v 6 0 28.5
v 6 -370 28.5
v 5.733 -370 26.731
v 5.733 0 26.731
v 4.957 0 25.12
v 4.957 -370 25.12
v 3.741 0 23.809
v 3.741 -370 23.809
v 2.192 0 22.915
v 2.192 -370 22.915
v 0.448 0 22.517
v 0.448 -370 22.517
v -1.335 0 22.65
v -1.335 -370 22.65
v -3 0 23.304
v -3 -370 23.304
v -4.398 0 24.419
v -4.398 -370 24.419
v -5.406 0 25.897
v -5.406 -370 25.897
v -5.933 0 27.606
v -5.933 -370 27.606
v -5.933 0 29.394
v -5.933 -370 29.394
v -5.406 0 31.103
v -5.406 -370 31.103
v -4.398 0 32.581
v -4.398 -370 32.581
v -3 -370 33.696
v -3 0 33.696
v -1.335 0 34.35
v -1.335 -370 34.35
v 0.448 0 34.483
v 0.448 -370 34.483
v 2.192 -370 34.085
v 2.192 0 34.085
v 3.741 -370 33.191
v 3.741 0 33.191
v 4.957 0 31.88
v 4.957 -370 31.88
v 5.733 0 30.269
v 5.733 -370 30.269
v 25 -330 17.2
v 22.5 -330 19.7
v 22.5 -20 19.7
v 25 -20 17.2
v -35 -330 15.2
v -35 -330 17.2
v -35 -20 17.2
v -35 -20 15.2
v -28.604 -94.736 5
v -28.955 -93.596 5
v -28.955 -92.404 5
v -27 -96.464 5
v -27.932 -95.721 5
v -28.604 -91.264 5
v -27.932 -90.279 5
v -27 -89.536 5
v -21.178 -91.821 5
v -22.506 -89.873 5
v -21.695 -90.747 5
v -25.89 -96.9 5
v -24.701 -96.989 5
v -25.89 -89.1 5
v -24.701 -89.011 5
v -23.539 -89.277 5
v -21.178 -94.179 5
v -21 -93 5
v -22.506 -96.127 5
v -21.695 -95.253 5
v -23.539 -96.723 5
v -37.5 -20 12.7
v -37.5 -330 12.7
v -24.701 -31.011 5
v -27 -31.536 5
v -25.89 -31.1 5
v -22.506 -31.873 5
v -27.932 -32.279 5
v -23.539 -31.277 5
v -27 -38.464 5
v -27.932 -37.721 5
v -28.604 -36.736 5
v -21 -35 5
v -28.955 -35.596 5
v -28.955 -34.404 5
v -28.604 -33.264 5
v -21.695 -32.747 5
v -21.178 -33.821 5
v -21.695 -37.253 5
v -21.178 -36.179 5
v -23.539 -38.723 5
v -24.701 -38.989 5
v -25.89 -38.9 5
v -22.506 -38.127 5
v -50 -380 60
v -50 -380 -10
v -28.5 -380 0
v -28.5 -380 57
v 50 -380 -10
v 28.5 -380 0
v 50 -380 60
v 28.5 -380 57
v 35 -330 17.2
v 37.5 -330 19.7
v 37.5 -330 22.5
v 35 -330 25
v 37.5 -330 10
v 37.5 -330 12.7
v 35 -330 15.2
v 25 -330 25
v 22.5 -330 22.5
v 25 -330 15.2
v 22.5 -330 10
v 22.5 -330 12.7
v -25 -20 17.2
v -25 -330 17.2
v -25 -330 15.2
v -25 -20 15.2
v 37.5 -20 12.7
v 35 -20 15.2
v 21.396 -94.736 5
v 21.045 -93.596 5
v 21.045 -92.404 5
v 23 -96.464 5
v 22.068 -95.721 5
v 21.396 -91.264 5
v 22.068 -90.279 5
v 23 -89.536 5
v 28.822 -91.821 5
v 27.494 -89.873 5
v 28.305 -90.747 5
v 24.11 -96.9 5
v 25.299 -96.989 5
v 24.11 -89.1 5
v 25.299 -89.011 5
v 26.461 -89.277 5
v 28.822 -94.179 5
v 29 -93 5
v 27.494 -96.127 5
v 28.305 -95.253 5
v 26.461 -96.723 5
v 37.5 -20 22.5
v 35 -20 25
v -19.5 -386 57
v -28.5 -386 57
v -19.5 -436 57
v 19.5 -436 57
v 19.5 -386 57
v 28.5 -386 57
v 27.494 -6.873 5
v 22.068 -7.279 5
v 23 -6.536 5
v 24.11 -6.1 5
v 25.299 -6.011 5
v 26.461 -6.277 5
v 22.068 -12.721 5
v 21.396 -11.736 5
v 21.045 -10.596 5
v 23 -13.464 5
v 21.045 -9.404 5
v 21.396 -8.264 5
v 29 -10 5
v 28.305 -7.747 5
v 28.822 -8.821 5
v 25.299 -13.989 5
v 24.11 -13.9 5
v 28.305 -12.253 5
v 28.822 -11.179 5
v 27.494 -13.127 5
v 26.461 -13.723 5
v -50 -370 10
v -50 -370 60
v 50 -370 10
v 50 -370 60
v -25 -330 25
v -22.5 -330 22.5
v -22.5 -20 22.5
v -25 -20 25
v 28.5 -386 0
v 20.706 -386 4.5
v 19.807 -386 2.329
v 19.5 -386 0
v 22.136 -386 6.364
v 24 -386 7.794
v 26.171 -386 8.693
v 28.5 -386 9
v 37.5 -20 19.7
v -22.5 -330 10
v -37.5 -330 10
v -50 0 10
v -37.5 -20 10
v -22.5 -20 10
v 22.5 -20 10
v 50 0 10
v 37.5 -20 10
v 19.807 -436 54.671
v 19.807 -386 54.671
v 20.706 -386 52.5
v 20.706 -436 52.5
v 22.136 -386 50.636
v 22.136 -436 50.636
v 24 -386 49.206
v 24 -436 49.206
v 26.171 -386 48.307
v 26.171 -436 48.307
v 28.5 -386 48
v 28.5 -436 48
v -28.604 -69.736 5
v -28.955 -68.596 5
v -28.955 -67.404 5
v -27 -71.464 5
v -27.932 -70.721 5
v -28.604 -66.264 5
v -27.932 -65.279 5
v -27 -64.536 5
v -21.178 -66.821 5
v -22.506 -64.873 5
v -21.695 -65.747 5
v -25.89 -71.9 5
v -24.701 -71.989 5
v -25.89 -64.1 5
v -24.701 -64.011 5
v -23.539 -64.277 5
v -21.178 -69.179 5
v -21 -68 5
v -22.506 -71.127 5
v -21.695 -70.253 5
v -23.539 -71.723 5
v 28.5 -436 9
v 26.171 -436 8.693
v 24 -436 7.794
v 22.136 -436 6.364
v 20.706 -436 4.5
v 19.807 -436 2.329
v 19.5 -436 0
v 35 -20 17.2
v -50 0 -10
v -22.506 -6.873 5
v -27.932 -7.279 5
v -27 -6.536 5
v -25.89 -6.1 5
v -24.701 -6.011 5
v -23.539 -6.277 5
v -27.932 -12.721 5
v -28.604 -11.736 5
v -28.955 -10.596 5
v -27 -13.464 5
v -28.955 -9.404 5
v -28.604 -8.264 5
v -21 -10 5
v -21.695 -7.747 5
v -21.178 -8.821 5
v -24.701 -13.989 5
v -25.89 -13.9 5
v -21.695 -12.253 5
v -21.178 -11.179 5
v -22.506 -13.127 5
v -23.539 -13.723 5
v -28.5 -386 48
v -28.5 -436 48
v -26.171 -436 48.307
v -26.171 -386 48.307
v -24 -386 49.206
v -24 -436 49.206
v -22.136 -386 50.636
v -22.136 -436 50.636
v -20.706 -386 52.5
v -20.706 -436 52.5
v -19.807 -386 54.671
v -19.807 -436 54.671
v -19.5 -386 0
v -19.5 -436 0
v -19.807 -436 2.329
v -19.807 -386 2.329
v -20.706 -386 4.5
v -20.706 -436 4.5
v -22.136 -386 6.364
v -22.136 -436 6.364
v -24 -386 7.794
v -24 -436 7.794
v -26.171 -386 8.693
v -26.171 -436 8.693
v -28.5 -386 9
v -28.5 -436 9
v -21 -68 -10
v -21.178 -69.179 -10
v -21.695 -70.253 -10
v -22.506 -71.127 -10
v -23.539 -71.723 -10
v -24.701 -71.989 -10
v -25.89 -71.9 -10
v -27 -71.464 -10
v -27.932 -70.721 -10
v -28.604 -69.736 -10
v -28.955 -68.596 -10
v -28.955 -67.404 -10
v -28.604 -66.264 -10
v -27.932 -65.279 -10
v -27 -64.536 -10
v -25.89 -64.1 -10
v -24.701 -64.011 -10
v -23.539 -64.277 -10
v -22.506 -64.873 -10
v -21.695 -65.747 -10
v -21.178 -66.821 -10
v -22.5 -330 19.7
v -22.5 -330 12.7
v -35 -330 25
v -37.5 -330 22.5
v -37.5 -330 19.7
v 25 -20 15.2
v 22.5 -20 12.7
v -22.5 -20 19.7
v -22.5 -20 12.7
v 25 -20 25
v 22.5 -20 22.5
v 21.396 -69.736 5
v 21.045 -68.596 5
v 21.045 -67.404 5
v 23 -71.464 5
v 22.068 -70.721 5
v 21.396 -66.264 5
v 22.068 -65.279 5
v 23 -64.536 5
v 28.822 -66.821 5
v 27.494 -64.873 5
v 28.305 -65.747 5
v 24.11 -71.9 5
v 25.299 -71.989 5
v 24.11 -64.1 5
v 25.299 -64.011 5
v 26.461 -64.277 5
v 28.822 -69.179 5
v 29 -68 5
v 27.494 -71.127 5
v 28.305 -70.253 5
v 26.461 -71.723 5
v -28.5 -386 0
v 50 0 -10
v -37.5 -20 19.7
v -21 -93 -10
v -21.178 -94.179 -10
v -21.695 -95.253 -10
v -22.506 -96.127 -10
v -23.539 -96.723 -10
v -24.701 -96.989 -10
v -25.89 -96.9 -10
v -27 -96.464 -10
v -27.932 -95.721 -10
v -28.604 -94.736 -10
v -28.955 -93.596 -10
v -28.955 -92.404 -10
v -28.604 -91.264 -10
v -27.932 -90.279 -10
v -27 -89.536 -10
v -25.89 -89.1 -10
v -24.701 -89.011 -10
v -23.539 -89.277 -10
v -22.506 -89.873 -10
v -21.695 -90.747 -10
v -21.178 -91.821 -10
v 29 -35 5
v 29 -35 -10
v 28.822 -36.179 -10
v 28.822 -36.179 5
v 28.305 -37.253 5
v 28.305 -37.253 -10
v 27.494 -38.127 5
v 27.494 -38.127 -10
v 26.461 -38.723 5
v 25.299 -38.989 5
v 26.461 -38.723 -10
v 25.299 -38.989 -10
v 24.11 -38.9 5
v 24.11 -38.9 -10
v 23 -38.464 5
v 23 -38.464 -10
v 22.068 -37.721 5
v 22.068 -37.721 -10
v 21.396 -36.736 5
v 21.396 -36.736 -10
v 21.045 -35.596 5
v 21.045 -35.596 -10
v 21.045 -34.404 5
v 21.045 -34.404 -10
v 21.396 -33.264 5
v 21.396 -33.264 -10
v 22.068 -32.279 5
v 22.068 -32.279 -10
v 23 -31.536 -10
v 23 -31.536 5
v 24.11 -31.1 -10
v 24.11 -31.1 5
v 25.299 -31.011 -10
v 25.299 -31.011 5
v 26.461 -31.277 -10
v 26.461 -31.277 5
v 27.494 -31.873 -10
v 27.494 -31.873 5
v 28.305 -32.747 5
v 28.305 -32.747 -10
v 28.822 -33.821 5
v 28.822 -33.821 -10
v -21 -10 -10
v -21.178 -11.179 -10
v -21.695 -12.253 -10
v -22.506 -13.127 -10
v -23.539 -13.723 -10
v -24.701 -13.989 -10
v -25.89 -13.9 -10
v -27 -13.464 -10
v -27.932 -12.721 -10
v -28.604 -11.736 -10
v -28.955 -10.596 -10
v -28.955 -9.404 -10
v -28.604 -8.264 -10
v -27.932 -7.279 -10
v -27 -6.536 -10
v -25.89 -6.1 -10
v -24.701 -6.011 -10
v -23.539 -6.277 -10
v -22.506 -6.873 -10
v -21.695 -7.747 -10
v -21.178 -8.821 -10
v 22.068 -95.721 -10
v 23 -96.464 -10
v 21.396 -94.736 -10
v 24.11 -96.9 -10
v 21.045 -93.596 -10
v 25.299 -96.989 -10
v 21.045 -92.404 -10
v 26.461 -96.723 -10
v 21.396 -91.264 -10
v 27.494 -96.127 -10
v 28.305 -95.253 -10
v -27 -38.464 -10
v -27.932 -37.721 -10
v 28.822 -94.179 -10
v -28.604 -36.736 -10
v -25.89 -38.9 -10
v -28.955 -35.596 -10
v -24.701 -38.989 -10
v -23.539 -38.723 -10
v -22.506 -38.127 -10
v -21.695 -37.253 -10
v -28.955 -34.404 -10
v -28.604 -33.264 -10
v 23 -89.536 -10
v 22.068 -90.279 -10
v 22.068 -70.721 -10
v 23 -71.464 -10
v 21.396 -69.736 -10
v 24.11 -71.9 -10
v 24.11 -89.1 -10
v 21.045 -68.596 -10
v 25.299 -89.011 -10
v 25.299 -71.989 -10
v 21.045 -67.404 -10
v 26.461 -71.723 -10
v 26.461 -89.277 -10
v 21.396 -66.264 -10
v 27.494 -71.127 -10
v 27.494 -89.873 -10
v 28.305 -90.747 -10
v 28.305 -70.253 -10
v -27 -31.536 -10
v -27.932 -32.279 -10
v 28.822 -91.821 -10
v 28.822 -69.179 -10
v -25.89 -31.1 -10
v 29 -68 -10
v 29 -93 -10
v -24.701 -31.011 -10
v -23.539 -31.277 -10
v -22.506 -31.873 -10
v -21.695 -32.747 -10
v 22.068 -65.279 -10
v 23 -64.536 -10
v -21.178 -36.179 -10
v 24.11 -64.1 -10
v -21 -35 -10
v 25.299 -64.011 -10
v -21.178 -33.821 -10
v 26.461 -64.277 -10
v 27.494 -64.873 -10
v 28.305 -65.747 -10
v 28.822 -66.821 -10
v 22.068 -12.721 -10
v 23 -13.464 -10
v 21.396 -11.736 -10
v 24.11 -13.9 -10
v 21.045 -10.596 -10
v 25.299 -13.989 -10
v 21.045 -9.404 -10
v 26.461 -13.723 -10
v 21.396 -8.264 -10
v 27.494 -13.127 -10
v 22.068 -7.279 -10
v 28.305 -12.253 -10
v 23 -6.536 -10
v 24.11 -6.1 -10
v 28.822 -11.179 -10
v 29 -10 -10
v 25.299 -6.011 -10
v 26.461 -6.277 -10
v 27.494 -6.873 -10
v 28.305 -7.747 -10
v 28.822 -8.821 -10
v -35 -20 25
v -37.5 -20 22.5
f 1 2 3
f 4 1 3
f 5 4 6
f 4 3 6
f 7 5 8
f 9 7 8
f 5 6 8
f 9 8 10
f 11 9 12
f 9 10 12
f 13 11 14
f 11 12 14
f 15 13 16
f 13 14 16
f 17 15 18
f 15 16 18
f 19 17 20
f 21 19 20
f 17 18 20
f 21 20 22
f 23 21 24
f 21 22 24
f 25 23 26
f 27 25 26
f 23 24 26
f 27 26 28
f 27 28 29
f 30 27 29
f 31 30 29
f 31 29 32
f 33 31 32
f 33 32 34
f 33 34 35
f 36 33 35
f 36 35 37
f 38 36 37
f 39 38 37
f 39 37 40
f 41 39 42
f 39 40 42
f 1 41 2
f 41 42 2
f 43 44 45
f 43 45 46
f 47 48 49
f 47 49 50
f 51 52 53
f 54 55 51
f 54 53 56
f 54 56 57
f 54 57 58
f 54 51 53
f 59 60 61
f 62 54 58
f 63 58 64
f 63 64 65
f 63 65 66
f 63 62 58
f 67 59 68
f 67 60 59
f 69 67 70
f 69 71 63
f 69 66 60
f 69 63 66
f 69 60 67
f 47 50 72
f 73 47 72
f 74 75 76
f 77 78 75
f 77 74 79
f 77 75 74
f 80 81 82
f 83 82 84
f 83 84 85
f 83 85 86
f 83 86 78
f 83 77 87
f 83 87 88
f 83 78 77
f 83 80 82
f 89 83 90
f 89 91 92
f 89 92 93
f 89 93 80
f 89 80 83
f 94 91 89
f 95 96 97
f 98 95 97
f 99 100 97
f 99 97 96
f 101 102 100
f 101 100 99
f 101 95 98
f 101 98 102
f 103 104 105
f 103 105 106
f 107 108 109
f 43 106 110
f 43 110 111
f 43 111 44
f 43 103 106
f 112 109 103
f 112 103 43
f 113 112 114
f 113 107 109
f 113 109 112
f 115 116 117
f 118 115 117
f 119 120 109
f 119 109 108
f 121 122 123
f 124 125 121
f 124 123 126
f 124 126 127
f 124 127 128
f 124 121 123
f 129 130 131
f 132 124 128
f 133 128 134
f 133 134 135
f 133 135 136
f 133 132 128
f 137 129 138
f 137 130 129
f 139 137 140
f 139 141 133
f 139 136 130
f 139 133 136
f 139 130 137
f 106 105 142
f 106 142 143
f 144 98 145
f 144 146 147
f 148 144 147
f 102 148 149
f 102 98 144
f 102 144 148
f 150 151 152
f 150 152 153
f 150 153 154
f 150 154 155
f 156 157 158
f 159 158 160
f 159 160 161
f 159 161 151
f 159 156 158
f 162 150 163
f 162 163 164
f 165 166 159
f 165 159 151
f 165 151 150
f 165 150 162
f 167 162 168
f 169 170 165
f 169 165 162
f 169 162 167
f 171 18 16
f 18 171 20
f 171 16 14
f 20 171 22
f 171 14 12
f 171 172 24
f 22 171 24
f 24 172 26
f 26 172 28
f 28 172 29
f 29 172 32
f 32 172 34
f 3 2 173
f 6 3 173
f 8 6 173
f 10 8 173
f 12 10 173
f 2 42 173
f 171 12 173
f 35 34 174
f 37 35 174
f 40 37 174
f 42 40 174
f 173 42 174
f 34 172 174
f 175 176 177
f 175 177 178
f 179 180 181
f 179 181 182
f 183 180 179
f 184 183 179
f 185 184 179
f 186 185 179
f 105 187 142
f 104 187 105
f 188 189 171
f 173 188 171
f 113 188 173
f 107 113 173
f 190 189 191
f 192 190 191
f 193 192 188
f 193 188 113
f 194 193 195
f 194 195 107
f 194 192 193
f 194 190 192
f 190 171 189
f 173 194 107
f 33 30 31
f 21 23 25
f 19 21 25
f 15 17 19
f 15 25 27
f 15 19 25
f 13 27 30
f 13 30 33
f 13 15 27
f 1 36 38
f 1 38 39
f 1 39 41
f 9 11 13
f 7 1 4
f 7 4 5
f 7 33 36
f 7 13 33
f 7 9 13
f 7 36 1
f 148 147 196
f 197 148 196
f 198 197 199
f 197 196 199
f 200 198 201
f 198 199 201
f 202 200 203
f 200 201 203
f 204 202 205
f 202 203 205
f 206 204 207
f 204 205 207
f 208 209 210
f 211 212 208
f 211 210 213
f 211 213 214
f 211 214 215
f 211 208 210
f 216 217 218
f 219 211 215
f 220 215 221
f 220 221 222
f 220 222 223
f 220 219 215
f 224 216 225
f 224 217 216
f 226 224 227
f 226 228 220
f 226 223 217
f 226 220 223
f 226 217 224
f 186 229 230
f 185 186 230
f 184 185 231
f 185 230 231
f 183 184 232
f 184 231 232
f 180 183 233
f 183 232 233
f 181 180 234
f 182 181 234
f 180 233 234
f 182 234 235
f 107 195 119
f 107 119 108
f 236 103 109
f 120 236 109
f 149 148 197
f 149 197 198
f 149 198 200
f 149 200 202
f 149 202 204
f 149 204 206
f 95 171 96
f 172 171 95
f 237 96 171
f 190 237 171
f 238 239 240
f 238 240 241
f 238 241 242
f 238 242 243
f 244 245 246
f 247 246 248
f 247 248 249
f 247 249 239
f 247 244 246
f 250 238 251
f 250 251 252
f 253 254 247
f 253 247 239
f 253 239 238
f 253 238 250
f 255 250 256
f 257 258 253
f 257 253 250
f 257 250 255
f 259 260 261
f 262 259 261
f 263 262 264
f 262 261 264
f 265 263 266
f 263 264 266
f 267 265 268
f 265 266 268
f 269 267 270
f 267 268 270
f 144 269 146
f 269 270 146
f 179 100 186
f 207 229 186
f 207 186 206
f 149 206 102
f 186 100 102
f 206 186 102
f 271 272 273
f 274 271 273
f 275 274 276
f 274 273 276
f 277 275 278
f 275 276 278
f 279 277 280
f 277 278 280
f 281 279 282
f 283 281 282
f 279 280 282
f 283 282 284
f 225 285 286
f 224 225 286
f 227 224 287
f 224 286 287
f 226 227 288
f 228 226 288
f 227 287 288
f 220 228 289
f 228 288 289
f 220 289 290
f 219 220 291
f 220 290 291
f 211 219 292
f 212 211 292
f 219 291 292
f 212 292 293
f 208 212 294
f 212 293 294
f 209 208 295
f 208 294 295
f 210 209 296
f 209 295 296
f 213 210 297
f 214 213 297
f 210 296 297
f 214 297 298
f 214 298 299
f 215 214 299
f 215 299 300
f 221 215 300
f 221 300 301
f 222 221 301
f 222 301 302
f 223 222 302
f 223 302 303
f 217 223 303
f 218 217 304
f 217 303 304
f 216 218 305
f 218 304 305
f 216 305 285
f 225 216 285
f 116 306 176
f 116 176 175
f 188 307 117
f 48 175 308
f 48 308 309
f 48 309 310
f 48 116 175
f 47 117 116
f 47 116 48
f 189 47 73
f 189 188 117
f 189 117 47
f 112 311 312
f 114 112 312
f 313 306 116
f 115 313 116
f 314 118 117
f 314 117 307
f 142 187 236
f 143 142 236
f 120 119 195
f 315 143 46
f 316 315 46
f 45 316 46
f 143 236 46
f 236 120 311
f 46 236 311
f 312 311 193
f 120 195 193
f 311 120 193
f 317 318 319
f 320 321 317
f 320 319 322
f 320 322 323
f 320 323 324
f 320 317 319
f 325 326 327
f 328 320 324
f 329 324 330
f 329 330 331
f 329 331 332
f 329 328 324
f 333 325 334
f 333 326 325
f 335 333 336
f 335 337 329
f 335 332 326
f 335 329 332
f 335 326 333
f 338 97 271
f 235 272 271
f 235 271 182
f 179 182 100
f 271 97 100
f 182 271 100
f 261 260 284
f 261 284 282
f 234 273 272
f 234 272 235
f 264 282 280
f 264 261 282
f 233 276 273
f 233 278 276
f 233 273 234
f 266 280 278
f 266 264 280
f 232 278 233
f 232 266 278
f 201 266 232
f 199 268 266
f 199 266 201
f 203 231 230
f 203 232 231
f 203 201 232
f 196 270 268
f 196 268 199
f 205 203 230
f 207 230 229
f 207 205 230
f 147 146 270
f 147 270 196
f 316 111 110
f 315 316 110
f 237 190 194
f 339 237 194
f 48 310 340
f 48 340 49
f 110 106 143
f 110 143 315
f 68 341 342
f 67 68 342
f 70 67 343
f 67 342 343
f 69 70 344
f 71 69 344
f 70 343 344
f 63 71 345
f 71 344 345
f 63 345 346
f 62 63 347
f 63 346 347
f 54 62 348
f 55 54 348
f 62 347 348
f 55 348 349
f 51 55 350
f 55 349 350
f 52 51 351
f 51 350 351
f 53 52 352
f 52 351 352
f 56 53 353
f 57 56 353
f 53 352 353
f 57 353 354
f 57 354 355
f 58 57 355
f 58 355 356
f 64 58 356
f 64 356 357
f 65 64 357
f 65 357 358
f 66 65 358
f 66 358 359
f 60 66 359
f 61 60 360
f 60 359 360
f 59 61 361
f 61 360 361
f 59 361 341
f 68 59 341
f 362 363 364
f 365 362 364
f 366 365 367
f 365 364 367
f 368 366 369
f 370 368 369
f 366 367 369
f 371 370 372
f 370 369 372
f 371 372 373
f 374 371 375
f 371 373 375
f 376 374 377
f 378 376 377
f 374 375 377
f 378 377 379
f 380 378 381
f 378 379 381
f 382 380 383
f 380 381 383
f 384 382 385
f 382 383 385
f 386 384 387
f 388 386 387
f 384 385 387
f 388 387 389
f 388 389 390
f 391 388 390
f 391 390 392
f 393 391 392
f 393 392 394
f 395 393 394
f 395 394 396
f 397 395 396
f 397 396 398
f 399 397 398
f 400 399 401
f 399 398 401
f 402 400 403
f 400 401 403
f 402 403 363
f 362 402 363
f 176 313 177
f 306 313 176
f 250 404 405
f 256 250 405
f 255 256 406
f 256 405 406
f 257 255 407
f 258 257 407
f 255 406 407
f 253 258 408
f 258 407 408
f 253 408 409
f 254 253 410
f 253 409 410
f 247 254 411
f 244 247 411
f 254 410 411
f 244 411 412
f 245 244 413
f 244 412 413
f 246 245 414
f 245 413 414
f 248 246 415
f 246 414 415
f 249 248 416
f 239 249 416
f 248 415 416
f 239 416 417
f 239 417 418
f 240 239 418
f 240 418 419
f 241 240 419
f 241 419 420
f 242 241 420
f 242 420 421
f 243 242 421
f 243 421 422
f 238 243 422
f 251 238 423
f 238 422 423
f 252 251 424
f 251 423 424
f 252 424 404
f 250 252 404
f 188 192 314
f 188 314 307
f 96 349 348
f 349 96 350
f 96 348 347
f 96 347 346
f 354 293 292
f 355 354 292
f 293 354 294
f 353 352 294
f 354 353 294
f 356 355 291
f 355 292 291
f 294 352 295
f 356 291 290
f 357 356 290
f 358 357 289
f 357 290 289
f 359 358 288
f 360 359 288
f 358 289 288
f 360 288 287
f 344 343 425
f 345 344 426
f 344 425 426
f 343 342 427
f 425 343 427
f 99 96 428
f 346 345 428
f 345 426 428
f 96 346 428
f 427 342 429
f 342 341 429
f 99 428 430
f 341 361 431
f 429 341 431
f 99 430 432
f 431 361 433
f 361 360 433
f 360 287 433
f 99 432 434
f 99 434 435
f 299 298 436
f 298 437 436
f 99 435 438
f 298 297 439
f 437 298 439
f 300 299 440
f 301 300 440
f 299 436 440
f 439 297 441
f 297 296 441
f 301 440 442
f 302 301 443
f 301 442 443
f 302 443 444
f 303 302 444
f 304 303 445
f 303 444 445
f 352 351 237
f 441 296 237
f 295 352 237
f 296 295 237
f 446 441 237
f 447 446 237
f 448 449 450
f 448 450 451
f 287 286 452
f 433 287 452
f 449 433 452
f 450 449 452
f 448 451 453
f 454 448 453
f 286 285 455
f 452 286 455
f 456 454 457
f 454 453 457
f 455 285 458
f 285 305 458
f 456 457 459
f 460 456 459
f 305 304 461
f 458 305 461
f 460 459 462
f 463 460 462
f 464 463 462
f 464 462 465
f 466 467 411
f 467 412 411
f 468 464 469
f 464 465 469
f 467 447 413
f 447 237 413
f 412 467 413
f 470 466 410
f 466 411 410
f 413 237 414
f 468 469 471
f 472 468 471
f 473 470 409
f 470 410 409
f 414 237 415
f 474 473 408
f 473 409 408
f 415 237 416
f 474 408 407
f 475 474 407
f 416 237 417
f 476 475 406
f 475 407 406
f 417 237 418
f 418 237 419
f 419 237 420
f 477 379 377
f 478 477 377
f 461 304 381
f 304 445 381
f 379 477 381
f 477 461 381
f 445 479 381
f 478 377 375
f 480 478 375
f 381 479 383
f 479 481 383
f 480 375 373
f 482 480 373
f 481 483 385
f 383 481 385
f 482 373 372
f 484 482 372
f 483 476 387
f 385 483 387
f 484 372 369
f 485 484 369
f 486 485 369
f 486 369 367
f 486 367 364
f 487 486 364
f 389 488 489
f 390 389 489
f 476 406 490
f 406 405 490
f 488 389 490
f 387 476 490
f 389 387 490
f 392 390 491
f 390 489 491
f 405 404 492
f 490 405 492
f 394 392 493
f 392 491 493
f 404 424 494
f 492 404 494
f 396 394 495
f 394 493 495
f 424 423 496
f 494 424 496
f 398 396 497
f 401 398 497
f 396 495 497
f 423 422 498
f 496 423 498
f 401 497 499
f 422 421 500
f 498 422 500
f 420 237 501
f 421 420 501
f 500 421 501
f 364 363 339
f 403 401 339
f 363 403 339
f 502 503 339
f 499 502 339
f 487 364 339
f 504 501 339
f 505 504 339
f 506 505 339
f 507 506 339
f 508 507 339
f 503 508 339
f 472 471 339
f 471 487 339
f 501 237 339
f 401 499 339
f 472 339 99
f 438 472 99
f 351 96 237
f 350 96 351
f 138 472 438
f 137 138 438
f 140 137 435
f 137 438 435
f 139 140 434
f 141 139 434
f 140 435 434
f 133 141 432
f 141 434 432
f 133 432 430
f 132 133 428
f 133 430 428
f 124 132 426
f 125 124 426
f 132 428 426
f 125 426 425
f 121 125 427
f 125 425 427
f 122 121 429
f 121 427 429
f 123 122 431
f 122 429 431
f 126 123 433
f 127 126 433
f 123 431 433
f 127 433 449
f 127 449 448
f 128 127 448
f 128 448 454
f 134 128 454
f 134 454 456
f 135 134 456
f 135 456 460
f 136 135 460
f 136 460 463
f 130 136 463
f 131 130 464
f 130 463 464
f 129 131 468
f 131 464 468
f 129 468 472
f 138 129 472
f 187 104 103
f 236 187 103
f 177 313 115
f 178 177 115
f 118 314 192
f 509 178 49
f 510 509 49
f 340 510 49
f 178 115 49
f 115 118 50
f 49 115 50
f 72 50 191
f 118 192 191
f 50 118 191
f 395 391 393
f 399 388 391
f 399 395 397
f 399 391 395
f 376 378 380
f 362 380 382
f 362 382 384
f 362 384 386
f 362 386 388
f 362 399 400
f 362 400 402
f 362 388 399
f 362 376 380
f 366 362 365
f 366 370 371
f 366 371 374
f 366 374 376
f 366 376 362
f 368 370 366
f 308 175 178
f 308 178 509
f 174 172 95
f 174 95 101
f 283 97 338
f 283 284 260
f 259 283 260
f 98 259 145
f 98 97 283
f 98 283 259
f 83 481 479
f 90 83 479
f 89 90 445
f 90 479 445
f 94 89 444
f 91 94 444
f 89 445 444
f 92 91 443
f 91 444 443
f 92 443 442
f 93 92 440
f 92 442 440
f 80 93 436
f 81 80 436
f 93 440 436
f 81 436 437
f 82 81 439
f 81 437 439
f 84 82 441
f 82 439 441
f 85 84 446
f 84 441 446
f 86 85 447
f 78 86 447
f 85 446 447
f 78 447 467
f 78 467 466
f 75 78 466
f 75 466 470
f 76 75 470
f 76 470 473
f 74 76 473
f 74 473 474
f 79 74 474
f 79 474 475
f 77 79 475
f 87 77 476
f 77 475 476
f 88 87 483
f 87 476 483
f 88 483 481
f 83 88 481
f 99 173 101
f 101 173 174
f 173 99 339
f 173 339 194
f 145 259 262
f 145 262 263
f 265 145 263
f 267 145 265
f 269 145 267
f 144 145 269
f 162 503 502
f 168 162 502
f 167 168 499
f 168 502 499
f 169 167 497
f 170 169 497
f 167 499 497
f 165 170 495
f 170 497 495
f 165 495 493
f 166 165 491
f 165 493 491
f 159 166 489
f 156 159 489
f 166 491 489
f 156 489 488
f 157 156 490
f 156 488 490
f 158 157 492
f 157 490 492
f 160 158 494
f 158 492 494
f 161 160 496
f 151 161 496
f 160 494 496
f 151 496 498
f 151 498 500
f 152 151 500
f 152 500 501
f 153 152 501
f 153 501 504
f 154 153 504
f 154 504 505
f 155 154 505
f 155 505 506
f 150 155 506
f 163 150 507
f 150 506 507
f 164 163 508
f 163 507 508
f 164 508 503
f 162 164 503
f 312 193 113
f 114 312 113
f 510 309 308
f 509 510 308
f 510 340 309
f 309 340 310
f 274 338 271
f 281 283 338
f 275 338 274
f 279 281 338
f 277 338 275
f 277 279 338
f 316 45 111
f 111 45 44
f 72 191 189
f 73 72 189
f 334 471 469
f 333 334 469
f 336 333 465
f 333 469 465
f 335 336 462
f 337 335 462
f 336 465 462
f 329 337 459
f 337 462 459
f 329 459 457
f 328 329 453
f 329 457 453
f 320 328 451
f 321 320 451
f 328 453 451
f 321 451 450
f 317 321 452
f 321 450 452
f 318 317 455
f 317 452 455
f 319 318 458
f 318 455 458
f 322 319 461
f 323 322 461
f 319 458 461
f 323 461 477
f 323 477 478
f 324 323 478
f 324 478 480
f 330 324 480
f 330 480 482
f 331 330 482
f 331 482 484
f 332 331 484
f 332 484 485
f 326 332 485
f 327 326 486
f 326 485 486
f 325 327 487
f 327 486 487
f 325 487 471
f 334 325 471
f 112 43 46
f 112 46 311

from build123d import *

# Parameters (mm, degrees)
SKETCH_W        = 100
SKETCH_H        = 20
PAD_DEPTH       = 370
SKETCH001_W     = 100
SKETCH001_H     = 70
PAD001_DEPTH    = 10
SKETCH002_W     = 57
SKETCH002_H     = 57
PAD002_DEPTH    = 56
SKETCH003_W     = 15
SKETCH003_H     = 310
PAD003_DEPTH    = 15
SKETCH004_R     = 6
PAD004_DEPTH    = 370
SKETCH005_R     = 4
POCKET_DEPTH    = 15
POCKET001_DEPTH = 50
POCKET002_DEPTH = 310


with BuildPart() as part:
    # Sketch → Pad (new body)
    with BuildSketch(Plane.XZ):
        Rectangle(SKETCH_W, SKETCH_H)
    extrude(amount=PAD_DEPTH)

    # Sketch001 (on Face6 of Pad) → Pad001 (join)
    with BuildSketch(Plane.XZ.offset(370)):
        with Locations((0, 25)):
            Rectangle(SKETCH001_W, SKETCH001_H)
    extrude(amount=PAD001_DEPTH)

    # Sketch002 (on Face11 of Pad001) → Pad002 (join)
    with BuildSketch(Plane.XZ.offset(380)):
        with Locations((0, 28.5)):
            Rectangle(SKETCH002_W, SKETCH002_H)
    extrude(amount=PAD002_DEPTH)

    # Sketch003 (on Face1 of Pad002) → Pad003 (join)
    with BuildSketch(Plane(origin=(0, 0, 10), x_dir=(-1, 0, 0), z_dir=(0, 0, 1))):
        with Locations((-30, 175)):
            Rectangle(SKETCH003_W, SKETCH003_H)
        with Locations((30, 175)):
            Rectangle(SKETCH003_W, SKETCH003_H)
    extrude(amount=PAD003_DEPTH)

    # Sketch004 (on Face4 of Pad003) → Pad004 (join)
    with BuildSketch(Plane(origin=(0, -370, 0), x_dir=(1, 0, 0), z_dir=(0, 1, 0))):
        with Locations((0, -28.5)):
            Circle(SKETCH004_R)
    extrude(amount=PAD004_DEPTH)

    # Sketch005 (on Face14 of Pad004) → Pocket (cut)
    with BuildSketch(Plane(origin=(0, 0, -10), x_dir=(1, 0, 0), z_dir=(0, 0, -1))):
        with Locations((-25, 10)):
            Circle(SKETCH005_R)
        with Locations((25, 10)):
            Circle(SKETCH005_R)
        with Locations((25, 35)):
            Circle(SKETCH005_R)
        with Locations((-25, 35)):
            Circle(SKETCH005_R)
        with Locations((-25, 93)):
            Circle(SKETCH005_R)
        with Locations((-25, 68)):
            Circle(SKETCH005_R)
        with Locations((25, 93)):
            Circle(SKETCH005_R)
        with Locations((25, 68)):
            Circle(SKETCH005_R)
    extrude(amount=-POCKET_DEPTH, mode=Mode.SUBTRACT)

    # Sketch006 (on Face44 of Pocket) → Pocket001 (cut)
    with BuildSketch(Plane.XZ.offset(436)):
        with BuildLine():
            ThreePointArc((-28.5, 48), (-22.136039, 50.636039), (-19.5, 57))
            Line((-19.5, 57), (-28.5, 57))
            Line((-28.5, 57), (-28.5, 48))
        make_face()
        with BuildLine():
            ThreePointArc((19.5, 57), (22.136039, 50.636039), (28.5, 48))
            Line((28.5, 48), (28.5, 57))
            Line((28.5, 57), (19.5, 57))
        make_face()
        with BuildLine():
            ThreePointArc((28.5, 9), (22.136039, 6.363961), (19.5, 0))
            Line((28.5, 0), (19.5, 0))
            Line((28.5, 0), (28.5, 9))
        make_face()
        with BuildLine():
            ThreePointArc((-19.5, 0), (-22.136039, 6.363961), (-28.5, 9))
            Line((-28.5, 9), (-28.5, 0))
            Line((-19.5, 0), (-28.5, 0))
        make_face()
    extrude(amount=-POCKET001_DEPTH, mode=Mode.SUBTRACT)

    # Sketch007 (on Face7 of Pocket001) → Pocket002 (cut)
    with BuildSketch(Plane(origin=(0, -20, 0), x_dir=(1, 0, 0), z_dir=(0, 1, 0))):
        Polygon((-37.5, -22.5), (-35, -25), (-37.5, -25), align=None)
        Polygon((-37.5, -19.7), (-35, -17.2), (-35, -15.2), (-37.5, -12.7), align=None)
        Polygon((22.5, -22.5), (25, -25), (22.5, -25), align=None)
        Polygon((22.5, -19.7), (25, -17.2), (25, -15.2), (22.5, -12.7), align=None)
        Polygon((-22.5, -22.5), (-25, -25), (-22.5, -25), align=None)
        Polygon((-22.5, -19.7), (-25, -17.2), (-25, -15.2), (-22.5, -12.7), align=None)
        Polygon((37.5, -22.5), (35, -25), (37.5, -25), align=None)
        Polygon((37.5, -19.7), (35, -17.2), (35, -15.2), (37.5, -12.7), align=None)
    extrude(amount=-POCKET002_DEPTH, mode=Mode.SUBTRACT)


solid = part.part
